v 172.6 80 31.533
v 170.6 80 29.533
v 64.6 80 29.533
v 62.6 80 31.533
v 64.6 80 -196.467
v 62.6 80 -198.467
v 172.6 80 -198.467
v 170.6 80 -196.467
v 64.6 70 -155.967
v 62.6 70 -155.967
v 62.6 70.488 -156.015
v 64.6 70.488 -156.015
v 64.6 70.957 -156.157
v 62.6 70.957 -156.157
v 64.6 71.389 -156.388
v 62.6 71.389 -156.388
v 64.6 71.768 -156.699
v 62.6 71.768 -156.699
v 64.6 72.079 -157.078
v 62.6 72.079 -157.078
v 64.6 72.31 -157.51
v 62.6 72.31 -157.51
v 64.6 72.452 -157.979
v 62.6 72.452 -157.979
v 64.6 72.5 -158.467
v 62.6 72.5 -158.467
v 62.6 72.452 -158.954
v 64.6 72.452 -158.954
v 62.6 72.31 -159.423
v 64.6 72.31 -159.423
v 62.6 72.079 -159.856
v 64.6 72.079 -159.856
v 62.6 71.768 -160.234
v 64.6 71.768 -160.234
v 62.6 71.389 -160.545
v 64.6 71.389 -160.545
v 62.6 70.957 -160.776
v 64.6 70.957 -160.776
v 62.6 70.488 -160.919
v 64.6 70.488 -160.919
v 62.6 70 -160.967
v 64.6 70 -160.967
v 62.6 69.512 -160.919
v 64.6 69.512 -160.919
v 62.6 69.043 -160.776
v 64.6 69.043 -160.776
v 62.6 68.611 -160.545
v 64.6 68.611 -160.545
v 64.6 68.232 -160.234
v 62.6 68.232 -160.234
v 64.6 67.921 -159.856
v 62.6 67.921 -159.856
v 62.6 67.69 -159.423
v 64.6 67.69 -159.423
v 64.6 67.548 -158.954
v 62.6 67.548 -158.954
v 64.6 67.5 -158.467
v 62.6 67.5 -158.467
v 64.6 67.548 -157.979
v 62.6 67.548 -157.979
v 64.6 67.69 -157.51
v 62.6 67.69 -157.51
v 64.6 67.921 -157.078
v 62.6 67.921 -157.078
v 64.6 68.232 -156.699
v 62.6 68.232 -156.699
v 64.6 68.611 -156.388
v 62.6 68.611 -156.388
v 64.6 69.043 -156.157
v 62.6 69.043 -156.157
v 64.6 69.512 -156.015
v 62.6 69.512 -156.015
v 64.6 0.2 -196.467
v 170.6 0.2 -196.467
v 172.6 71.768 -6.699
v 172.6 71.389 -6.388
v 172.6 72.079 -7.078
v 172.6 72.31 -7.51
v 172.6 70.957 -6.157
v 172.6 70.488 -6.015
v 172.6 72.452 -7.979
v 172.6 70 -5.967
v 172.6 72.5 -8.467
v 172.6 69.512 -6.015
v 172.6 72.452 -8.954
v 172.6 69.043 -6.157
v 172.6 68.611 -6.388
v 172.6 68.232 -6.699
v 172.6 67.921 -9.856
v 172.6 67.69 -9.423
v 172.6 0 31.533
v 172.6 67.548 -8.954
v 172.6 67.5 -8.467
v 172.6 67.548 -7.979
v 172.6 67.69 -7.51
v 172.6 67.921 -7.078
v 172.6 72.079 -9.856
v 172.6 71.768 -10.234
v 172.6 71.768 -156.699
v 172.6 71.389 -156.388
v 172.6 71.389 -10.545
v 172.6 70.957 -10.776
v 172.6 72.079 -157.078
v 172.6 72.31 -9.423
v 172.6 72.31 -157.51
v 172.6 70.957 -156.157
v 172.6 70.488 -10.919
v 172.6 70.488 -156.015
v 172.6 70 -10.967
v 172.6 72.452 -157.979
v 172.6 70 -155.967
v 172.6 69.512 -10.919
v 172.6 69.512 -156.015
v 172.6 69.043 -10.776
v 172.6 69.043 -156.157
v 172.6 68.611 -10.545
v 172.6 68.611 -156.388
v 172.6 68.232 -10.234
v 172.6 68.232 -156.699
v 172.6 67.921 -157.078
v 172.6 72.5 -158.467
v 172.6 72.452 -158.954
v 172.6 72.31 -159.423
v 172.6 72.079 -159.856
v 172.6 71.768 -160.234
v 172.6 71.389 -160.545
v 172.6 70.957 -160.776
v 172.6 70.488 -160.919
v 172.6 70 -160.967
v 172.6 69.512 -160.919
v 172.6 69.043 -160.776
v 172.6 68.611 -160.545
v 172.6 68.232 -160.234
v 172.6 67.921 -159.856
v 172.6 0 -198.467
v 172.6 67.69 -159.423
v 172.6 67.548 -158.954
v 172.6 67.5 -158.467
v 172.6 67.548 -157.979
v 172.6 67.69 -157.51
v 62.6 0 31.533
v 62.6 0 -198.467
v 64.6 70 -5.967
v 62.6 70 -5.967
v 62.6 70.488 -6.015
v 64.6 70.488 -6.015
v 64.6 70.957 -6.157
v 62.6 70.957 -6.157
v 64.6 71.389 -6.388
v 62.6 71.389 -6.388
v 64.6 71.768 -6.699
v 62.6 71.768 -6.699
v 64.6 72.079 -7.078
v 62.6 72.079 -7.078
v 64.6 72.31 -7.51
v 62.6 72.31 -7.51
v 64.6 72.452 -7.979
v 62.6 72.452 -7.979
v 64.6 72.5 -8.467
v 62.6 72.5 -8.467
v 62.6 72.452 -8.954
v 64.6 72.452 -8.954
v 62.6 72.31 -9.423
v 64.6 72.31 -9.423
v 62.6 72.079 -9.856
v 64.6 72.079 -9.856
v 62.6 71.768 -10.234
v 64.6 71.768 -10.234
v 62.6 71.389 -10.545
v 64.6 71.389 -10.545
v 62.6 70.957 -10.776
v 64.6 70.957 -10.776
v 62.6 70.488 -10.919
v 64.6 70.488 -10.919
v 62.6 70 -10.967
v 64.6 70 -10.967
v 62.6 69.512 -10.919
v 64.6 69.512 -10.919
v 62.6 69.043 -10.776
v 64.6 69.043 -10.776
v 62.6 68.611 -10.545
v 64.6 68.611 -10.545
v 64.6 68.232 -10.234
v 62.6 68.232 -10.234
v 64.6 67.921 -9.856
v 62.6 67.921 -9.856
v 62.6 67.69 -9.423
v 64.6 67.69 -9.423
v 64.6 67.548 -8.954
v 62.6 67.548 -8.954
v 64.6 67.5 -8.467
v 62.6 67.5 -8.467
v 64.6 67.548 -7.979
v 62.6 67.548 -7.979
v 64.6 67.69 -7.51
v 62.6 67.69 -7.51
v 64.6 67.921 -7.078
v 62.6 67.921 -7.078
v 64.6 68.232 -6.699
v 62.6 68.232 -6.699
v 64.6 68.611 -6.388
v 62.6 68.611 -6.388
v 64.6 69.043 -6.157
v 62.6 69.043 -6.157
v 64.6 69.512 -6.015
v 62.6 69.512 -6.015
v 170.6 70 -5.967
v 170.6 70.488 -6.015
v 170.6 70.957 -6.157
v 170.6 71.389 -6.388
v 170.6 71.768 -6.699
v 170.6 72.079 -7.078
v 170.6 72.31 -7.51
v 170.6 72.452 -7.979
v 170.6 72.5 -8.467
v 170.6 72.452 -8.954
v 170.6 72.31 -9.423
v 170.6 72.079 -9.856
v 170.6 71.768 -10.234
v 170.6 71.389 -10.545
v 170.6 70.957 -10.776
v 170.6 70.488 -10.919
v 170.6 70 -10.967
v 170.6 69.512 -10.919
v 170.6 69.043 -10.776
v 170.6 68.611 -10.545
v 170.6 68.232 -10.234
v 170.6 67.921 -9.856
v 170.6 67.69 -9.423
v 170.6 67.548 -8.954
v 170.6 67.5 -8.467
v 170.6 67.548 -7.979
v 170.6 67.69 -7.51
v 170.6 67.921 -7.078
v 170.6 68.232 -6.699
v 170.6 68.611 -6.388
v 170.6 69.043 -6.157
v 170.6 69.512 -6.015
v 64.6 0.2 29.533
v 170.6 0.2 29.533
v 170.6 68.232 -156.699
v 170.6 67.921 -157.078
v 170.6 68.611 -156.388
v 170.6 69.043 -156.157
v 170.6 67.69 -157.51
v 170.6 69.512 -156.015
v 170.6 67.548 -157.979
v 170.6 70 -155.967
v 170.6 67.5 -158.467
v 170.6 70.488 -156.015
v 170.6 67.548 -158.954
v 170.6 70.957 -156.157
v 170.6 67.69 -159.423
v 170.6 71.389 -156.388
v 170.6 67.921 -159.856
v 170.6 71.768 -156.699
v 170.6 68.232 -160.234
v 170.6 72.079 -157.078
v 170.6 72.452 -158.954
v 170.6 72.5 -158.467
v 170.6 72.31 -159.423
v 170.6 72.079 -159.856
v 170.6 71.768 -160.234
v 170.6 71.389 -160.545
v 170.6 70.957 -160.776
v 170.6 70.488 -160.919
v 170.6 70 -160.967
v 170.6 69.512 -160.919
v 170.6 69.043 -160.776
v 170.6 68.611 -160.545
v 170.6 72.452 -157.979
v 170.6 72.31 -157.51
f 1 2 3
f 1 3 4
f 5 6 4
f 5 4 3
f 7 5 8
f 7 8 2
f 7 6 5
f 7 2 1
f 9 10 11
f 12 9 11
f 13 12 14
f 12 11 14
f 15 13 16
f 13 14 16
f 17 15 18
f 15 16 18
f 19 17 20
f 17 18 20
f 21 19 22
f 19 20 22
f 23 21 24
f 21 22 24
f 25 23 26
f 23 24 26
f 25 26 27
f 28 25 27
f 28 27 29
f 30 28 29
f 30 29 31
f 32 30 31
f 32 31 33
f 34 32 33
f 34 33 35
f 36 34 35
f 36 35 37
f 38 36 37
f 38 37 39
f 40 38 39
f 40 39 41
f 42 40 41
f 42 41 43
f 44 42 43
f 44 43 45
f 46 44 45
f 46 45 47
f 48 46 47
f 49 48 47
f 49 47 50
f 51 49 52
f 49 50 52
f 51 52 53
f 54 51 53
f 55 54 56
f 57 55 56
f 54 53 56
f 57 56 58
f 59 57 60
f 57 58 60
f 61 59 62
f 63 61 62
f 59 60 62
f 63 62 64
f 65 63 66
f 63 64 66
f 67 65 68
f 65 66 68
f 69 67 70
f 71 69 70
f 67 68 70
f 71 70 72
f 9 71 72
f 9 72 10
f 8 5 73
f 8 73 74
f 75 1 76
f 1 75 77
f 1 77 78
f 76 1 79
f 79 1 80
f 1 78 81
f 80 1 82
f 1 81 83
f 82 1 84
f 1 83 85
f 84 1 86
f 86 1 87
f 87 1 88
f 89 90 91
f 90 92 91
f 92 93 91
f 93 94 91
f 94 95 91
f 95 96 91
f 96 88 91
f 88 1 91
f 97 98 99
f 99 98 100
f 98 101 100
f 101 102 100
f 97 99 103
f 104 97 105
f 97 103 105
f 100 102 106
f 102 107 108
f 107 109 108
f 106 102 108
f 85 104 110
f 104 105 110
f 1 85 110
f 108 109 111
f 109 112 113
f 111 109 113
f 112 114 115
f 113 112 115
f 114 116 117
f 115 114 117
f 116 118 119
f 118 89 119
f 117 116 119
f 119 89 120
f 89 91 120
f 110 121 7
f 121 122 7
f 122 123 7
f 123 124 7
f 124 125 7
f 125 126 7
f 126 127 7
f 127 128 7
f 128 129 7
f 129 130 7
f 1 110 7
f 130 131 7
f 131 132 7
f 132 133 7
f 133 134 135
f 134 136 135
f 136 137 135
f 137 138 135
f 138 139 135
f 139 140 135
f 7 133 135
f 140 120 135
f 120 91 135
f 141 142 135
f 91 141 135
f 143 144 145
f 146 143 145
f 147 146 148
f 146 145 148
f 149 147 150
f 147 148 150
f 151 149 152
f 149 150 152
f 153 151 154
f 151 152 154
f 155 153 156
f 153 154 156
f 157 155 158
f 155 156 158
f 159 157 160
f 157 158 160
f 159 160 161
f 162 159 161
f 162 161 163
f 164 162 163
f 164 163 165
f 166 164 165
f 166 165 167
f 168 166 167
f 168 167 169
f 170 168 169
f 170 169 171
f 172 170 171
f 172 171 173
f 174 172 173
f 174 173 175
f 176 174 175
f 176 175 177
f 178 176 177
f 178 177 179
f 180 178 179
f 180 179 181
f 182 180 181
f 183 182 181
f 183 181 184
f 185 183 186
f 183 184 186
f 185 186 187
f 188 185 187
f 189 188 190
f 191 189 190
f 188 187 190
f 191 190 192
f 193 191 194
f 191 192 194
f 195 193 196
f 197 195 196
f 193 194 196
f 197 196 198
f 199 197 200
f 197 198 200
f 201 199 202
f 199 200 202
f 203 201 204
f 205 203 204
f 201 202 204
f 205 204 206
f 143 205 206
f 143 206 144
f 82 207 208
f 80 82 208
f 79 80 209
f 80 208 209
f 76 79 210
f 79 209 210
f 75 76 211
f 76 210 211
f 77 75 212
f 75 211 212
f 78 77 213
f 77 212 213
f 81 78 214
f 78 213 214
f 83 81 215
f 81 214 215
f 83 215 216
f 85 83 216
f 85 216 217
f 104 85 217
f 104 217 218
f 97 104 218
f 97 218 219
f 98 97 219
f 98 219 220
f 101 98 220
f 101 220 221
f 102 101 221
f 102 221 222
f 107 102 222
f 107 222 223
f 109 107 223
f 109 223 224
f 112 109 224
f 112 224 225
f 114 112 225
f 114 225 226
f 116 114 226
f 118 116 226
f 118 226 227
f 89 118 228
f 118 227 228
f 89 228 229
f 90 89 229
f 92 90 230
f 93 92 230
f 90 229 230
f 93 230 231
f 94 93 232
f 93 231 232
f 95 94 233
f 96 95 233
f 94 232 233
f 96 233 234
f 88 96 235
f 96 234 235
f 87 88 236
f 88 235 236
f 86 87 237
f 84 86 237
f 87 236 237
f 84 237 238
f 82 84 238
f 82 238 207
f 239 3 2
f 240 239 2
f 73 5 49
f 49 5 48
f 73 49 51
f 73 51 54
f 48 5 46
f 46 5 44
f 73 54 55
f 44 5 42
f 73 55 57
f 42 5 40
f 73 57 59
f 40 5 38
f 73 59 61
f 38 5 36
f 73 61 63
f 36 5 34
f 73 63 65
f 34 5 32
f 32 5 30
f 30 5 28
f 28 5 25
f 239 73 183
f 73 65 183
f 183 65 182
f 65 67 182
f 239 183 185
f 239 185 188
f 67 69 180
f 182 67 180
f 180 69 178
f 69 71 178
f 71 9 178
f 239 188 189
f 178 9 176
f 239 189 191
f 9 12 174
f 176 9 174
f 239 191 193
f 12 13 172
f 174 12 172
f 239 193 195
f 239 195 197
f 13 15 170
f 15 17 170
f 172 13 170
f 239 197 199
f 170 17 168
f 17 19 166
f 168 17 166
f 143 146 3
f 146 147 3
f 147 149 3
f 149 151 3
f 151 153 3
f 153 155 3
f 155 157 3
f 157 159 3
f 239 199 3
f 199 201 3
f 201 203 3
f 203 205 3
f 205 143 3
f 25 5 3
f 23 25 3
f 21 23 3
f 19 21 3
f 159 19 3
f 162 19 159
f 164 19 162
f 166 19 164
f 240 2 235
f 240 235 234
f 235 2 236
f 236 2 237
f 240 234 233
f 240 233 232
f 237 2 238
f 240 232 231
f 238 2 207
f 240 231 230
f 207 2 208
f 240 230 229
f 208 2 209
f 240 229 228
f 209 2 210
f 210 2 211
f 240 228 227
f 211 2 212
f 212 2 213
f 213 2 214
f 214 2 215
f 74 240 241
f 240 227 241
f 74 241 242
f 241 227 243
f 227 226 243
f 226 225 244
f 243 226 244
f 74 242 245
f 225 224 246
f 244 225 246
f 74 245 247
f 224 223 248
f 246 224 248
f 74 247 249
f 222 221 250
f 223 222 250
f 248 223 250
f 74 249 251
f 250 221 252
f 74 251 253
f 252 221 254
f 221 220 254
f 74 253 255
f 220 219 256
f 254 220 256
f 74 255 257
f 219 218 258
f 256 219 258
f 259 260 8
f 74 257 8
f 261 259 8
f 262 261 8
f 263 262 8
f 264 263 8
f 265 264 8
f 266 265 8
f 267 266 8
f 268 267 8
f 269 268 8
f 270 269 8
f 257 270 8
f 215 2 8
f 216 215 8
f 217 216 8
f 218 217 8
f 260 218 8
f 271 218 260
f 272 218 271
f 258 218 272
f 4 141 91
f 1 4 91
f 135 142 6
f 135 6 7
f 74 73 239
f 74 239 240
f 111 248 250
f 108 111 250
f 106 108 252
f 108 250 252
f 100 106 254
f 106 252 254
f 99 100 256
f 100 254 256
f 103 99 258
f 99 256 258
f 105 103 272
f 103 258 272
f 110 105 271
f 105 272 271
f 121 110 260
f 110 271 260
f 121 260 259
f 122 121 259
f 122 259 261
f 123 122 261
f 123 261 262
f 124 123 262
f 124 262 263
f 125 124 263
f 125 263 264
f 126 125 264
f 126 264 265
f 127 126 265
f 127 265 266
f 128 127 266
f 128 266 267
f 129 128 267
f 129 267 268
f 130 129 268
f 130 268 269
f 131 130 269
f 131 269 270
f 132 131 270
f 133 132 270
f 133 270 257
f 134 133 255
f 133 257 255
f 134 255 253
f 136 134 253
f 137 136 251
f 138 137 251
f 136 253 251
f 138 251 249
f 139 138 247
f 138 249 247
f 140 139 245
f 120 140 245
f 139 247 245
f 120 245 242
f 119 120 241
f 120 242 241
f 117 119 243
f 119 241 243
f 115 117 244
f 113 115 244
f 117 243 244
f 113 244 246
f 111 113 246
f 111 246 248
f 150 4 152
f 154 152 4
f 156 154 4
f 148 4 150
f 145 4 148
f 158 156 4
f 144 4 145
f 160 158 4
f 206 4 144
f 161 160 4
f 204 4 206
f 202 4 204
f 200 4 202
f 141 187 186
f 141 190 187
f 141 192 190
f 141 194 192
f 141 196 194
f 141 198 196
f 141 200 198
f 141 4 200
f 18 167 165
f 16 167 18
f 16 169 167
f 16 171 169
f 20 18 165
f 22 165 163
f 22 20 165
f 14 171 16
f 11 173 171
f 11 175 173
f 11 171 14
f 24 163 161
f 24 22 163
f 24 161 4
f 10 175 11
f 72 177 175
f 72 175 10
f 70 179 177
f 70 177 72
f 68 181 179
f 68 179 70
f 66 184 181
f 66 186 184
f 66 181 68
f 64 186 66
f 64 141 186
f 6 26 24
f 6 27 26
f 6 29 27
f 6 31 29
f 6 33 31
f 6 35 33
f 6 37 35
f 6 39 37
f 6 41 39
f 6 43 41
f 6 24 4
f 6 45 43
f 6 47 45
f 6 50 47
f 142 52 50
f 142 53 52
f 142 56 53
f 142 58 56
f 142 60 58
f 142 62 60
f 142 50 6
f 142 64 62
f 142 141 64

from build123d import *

# Parameters (mm, degrees)
SKETCH4_W           = 110
SKETCH4_H           = 230
BOSS_EXTRUDE3_DEPTH = 80
SKETCH5_W           = 106
SKETCH5_H           = 113
CUT_EXTRUDE2_DEPTH  = 79.8
SKETCH6_R           = 2.5
CUT_EXTRUDE3_DEPTH  = 130


with BuildPart() as part:
    # Sketch4 → Boss-Extrude3 (new body)
    with BuildSketch(Plane(origin=(0, 0, 0), x_dir=(1, 0, 0), z_dir=(0, 1, 0))):
        with Locations((117.5995229, 83.46665824)):
            Rectangle(SKETCH4_W, SKETCH4_H)
    extrude(amount=BOSS_EXTRUDE3_DEPTH)

    # Sketch5 → Cut-Extrude2 (cut)
    with BuildSketch(Plane(origin=(0, 80, 0), x_dir=(1, 0, 0), z_dir=(0, 1, 0))):
        with Locations((117.5995229, 139.96665824)):
            Rectangle(SKETCH5_W, SKETCH5_H)
        with Locations((117.5995229, 26.96665824)):
            Rectangle(SKETCH5_W, SKETCH5_H)
    extrude(amount=-CUT_EXTRUDE2_DEPTH, mode=Mode.SUBTRACT)

    # Sketch6 → Cut-Extrude3 (cut)
    with BuildSketch(Plane.ZY.offset(-62.5995229)):
        with Locations((-158.46665824, 70)):
            Circle(SKETCH6_R)
        with Locations((-8.46665824, 70)):
            Circle(SKETCH6_R)
    extrude(amount=-CUT_EXTRUDE3_DEPTH, mode=Mode.SUBTRACT)


solid = part.part
